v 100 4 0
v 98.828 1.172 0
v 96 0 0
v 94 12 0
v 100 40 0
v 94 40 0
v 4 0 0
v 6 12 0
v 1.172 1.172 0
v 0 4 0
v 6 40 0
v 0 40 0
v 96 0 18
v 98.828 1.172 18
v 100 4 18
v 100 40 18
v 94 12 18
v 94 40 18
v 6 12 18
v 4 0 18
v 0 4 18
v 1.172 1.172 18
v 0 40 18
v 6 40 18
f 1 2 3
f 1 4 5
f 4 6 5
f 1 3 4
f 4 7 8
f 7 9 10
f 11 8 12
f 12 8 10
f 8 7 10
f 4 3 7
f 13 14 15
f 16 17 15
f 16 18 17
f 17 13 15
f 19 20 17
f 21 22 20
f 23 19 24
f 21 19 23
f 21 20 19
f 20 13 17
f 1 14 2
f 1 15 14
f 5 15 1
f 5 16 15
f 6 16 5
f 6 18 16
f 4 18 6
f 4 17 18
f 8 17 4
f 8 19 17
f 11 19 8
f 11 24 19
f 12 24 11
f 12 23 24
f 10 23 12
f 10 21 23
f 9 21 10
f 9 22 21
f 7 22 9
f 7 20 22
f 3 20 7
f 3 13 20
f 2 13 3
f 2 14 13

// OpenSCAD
$fn = 32;

// ----------------------------------------------------------------------
// Heat sink frame: 100 x 40 mm frame, 6 mm walls
// ----------------------------------------------------------------------

// --- parameters (mm) ---
profile_height = 18;      // extrusion height
profile_points = 12;      // points of the closed outline

profile = [[0, 4], [1.172, 1.172], [4, 0], [96, 0], [98.828, 1.172], [100, 4], [100, 40], [94, 40], [94, 12], [6, 12], [6, 40], [0, 40]];  // single closed polygon, 12 points, counter clockwise

// --- the one profile operation ---
linear_extrude(height = profile_height) polygon(points = profile);
